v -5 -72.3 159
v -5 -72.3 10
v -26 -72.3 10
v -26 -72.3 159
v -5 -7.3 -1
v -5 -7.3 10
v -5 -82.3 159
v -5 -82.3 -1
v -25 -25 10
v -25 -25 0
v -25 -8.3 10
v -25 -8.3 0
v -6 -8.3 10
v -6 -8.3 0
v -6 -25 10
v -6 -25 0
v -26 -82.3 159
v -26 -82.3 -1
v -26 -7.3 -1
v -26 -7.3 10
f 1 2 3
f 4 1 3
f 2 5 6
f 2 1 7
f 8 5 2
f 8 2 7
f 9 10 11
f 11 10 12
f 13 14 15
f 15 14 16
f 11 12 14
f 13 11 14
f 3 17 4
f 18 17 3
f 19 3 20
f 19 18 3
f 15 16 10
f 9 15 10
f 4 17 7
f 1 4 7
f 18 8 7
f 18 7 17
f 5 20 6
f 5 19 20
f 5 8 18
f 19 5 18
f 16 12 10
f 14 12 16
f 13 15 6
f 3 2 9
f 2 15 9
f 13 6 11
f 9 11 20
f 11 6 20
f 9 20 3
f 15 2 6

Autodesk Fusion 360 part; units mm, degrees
sketch "Szkic1" plane through (0, 0, 0) normal (0, 0, 1) x (1, 0, 0)
  line L0 (-6, -25) -> (-25, -25)
  line L1 (-25, -25) -> (-25, -8.3)
  line L2 (-25, -8.3) -> (-6, -8.3)
  line L3 (-6, -8.3) -> (-6, -25)
  line L4 (-26, -7.3) -> (-5, -7.3)
  line L5 (-5, -7.3) -> (-5, -26)
  line L6 (-5, -26) -> (-26, -26)
  line L7 (-26, -26) -> (-26, -7.3)
  dimension "d1" = 16.7
  dimension "d2" = 19
  dimension "d3" = 1
  dimension "d4" = 1
  dimension "d5" = 1
  dimension "d6" = 1
extrude "Wyciągnięcie proste1" add sketch "Szkic1" along normal blind 10
extrude "Wyciągnięcie proste2" add sketch "Szkic1" against normal blind 1 contours L0 L1 L2 L3 | L4 L5 L6 L7
extrude "Wyciągnięcie proste3" add 1 faces at (-12, -26, 2.6667) along direction (0, -1, 0) blind 46.3
extrude "Wyciągnięcie proste4" add 1 faces at (-12, -72.3, 2.6667) along direction (0, -1, 0) blind 10
sketch "Szkic2" plane through (0, 0, -1) normal (0, 0, -1) x (1, 0, 0)
  line L0 (-26, 82.3) -> (-26, 7.3)
  line L1 (-26, 7.3) -> (-5, 7.3)
  line L2 (-5, 7.3) -> (-5, 82.3)
  line L3 (-5, 82.3) -> (-26, 82.3)
  line L4 (-26, 82.3) -> (-5, 82.3)
  line L5 (-5, 82.3) -> (-5, 72.3)
  line L6 (-5, 72.3) -> (-26, 72.3)
  line L7 (-26, 72.3) -> (-26, 82.3)
  dimension "d15" = 10
extrude "Wyciągnięcie proste5" add sketch "Szkic2" against normal blind 160 contours L0 L2 L3 L4 L5 L6 L7
equation "d11 = 65 mm - 18.7 mm"
